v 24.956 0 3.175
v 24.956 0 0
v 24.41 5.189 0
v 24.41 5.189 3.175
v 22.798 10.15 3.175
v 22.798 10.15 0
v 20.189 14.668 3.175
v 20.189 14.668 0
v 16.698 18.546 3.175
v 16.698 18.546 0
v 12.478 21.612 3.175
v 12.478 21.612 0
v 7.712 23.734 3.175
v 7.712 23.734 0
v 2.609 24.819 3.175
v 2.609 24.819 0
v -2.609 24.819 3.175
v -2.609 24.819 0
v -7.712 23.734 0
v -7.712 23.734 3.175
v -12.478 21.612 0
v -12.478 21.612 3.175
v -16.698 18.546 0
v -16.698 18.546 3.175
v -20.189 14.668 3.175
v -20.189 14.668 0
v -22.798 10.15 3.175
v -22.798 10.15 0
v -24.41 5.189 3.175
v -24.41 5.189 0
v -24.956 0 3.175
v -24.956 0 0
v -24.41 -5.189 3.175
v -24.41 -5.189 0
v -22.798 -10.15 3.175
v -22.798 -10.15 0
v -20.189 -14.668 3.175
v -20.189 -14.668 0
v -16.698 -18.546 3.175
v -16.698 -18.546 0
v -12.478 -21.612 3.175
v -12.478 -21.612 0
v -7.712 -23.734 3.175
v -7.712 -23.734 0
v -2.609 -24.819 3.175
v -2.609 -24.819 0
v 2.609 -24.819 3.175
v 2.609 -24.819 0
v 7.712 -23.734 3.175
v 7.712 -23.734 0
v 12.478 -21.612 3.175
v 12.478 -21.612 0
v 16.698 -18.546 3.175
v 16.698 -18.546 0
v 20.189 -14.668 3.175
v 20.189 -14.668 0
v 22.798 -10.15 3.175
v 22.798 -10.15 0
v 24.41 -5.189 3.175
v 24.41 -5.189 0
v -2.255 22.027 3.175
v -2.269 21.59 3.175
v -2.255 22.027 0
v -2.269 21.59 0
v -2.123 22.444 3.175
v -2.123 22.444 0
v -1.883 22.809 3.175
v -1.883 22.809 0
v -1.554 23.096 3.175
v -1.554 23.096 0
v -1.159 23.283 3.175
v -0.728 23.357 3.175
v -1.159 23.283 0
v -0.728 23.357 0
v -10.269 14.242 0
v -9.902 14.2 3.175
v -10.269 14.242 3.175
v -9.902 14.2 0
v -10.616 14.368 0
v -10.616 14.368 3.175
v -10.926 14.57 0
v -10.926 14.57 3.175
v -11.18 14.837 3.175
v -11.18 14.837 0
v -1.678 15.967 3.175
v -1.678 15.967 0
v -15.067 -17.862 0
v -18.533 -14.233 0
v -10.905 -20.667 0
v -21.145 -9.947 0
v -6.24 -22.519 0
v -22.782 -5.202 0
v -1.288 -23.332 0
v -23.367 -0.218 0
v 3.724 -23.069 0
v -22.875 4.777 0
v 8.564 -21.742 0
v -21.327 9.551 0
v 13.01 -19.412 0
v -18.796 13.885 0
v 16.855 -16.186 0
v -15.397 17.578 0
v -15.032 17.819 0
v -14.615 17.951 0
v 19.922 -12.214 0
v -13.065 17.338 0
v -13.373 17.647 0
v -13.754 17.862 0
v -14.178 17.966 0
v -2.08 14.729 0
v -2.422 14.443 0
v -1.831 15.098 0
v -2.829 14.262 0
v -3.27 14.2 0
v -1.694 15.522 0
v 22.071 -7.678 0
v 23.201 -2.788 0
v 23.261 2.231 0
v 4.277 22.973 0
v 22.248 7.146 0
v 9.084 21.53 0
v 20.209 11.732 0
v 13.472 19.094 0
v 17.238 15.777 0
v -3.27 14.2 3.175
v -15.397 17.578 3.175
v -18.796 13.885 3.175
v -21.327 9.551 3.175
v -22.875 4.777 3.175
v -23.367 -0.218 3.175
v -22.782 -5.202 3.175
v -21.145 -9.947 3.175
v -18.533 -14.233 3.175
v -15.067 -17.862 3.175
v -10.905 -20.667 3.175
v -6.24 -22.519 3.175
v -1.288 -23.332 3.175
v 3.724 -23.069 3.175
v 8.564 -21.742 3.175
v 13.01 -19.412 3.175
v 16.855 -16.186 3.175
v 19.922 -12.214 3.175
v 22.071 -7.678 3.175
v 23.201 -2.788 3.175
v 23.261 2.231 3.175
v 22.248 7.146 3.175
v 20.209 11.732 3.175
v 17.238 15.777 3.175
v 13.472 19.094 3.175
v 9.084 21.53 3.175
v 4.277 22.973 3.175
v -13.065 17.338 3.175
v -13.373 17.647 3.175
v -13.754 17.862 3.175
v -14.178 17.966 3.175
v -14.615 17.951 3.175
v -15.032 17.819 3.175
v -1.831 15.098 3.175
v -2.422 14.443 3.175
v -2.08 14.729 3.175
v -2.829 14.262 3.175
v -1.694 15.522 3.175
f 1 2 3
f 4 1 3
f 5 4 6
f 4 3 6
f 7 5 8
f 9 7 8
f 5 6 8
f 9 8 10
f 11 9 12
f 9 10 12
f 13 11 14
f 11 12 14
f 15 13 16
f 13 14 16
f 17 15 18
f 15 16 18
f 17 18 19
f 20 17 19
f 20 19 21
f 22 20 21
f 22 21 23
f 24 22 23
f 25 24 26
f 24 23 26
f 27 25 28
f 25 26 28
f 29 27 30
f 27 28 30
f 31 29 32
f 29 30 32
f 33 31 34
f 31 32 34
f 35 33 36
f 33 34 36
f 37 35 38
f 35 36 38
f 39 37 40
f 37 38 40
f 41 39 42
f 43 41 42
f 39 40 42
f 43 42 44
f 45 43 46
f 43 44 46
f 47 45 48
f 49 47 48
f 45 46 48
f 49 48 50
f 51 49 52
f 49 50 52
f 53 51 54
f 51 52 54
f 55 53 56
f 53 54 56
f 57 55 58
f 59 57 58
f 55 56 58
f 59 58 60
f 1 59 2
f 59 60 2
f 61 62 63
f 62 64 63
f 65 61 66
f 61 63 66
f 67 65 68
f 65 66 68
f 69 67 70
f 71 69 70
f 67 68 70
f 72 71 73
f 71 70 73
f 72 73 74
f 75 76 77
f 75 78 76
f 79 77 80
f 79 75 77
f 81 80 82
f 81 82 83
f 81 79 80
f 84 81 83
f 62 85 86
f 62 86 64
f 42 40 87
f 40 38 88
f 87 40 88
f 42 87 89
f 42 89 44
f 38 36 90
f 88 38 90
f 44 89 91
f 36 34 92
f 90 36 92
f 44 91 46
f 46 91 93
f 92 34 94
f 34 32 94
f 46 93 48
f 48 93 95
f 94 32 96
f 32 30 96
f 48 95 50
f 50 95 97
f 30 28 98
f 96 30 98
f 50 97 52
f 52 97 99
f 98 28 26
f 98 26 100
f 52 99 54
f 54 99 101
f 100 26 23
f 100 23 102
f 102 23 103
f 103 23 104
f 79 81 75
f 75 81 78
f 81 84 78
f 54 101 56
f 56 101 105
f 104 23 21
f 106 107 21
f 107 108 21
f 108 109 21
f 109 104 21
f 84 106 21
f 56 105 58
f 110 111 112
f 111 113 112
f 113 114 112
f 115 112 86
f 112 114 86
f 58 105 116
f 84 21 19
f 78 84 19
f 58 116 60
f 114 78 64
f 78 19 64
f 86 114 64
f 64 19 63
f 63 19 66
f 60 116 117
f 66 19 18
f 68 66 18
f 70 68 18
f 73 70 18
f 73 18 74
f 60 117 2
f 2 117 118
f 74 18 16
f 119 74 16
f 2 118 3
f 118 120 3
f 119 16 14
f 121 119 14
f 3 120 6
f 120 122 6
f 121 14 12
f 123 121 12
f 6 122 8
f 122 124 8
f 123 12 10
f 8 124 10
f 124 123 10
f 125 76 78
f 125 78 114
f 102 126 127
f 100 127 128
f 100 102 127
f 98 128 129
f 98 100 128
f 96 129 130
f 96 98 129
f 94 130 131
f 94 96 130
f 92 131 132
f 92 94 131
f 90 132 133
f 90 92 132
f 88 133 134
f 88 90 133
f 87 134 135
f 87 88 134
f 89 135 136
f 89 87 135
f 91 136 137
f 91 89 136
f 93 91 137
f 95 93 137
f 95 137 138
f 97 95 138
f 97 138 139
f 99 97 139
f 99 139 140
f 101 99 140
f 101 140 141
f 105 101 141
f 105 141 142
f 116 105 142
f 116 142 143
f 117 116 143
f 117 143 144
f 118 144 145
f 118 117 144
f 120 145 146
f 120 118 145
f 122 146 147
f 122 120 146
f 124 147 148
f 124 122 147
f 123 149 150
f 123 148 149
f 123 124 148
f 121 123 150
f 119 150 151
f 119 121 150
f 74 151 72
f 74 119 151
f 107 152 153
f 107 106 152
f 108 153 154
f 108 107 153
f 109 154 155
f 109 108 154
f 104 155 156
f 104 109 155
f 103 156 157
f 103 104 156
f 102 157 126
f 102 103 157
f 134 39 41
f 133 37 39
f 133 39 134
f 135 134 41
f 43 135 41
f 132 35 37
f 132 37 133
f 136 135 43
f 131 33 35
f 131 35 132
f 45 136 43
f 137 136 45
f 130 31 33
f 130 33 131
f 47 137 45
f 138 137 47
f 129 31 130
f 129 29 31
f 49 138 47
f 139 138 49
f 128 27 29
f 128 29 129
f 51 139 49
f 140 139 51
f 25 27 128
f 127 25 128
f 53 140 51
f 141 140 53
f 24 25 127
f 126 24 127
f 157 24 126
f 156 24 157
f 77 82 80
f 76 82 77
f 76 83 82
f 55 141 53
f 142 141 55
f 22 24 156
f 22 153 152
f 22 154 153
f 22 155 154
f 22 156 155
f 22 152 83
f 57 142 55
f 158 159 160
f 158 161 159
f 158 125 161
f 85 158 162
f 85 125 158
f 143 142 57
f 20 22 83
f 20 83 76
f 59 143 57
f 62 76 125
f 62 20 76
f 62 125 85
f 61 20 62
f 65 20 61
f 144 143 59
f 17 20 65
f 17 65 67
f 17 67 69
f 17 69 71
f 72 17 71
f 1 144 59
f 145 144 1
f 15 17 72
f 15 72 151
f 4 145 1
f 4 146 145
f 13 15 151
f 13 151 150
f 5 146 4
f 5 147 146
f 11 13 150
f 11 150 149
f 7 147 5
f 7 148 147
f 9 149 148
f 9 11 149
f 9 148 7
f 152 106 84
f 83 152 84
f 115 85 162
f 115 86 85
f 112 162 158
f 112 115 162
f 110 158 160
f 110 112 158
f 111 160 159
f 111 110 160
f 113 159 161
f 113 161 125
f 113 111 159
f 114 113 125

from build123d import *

# Parameters (mm, degrees)
SKETCH1_R           = 24.9555
SKETCH1_R_2         = 23.368
BOSS_EXTRUDE1_DEPTH = 3.175
BOSS_EXTRUDE2_DEPTH = 3.175
FILLET1_R           = 1.6002


with BuildPart() as part:
    # Sketch1 → Boss-Extrude1 (new body)
    with BuildSketch(Plane.XY):
        Circle(SKETCH1_R)
        Circle(SKETCH1_R_2, mode=Mode.SUBTRACT)
    extrude(amount=BOSS_EXTRUDE1_DEPTH)

    # Sketch2 → Boss-Extrude2 (add, through all)
    with BuildSketch(Plane.XY.offset(3.175)):
        with BuildLine():
            Line((-14.063213461, 18.662514599), (-10.700271112, 14.199739369))
            Line((-10.700271112, 14.199739369), (-1.492452747, 14.199739369))
            Line((-1.492452747, 14.199739369), (-2.44262113, 23.239987651))
            ThreePointArc((-2.44262113, 23.239987651), (-8.564400666, 21.741997729), (-14.063213461, 18.662514599))
        make_face()
    extrude(amount=-BOSS_EXTRUDE2_DEPTH)

    # Fillet1
    fillet1_edges = [part.edges().sort_by_distance(p)[0] for p in [
        (-14.063213461, 18.662514599, 1.5875),
        (-2.44262113, 23.239987651, 1.5875),
        (-1.492452747, 14.199739369, 1.5875),
        (-10.700271112, 14.199739369, 1.5875),
    ]]
    fillet(fillet1_edges, radius=FILLET1_R)


solid = part.part
